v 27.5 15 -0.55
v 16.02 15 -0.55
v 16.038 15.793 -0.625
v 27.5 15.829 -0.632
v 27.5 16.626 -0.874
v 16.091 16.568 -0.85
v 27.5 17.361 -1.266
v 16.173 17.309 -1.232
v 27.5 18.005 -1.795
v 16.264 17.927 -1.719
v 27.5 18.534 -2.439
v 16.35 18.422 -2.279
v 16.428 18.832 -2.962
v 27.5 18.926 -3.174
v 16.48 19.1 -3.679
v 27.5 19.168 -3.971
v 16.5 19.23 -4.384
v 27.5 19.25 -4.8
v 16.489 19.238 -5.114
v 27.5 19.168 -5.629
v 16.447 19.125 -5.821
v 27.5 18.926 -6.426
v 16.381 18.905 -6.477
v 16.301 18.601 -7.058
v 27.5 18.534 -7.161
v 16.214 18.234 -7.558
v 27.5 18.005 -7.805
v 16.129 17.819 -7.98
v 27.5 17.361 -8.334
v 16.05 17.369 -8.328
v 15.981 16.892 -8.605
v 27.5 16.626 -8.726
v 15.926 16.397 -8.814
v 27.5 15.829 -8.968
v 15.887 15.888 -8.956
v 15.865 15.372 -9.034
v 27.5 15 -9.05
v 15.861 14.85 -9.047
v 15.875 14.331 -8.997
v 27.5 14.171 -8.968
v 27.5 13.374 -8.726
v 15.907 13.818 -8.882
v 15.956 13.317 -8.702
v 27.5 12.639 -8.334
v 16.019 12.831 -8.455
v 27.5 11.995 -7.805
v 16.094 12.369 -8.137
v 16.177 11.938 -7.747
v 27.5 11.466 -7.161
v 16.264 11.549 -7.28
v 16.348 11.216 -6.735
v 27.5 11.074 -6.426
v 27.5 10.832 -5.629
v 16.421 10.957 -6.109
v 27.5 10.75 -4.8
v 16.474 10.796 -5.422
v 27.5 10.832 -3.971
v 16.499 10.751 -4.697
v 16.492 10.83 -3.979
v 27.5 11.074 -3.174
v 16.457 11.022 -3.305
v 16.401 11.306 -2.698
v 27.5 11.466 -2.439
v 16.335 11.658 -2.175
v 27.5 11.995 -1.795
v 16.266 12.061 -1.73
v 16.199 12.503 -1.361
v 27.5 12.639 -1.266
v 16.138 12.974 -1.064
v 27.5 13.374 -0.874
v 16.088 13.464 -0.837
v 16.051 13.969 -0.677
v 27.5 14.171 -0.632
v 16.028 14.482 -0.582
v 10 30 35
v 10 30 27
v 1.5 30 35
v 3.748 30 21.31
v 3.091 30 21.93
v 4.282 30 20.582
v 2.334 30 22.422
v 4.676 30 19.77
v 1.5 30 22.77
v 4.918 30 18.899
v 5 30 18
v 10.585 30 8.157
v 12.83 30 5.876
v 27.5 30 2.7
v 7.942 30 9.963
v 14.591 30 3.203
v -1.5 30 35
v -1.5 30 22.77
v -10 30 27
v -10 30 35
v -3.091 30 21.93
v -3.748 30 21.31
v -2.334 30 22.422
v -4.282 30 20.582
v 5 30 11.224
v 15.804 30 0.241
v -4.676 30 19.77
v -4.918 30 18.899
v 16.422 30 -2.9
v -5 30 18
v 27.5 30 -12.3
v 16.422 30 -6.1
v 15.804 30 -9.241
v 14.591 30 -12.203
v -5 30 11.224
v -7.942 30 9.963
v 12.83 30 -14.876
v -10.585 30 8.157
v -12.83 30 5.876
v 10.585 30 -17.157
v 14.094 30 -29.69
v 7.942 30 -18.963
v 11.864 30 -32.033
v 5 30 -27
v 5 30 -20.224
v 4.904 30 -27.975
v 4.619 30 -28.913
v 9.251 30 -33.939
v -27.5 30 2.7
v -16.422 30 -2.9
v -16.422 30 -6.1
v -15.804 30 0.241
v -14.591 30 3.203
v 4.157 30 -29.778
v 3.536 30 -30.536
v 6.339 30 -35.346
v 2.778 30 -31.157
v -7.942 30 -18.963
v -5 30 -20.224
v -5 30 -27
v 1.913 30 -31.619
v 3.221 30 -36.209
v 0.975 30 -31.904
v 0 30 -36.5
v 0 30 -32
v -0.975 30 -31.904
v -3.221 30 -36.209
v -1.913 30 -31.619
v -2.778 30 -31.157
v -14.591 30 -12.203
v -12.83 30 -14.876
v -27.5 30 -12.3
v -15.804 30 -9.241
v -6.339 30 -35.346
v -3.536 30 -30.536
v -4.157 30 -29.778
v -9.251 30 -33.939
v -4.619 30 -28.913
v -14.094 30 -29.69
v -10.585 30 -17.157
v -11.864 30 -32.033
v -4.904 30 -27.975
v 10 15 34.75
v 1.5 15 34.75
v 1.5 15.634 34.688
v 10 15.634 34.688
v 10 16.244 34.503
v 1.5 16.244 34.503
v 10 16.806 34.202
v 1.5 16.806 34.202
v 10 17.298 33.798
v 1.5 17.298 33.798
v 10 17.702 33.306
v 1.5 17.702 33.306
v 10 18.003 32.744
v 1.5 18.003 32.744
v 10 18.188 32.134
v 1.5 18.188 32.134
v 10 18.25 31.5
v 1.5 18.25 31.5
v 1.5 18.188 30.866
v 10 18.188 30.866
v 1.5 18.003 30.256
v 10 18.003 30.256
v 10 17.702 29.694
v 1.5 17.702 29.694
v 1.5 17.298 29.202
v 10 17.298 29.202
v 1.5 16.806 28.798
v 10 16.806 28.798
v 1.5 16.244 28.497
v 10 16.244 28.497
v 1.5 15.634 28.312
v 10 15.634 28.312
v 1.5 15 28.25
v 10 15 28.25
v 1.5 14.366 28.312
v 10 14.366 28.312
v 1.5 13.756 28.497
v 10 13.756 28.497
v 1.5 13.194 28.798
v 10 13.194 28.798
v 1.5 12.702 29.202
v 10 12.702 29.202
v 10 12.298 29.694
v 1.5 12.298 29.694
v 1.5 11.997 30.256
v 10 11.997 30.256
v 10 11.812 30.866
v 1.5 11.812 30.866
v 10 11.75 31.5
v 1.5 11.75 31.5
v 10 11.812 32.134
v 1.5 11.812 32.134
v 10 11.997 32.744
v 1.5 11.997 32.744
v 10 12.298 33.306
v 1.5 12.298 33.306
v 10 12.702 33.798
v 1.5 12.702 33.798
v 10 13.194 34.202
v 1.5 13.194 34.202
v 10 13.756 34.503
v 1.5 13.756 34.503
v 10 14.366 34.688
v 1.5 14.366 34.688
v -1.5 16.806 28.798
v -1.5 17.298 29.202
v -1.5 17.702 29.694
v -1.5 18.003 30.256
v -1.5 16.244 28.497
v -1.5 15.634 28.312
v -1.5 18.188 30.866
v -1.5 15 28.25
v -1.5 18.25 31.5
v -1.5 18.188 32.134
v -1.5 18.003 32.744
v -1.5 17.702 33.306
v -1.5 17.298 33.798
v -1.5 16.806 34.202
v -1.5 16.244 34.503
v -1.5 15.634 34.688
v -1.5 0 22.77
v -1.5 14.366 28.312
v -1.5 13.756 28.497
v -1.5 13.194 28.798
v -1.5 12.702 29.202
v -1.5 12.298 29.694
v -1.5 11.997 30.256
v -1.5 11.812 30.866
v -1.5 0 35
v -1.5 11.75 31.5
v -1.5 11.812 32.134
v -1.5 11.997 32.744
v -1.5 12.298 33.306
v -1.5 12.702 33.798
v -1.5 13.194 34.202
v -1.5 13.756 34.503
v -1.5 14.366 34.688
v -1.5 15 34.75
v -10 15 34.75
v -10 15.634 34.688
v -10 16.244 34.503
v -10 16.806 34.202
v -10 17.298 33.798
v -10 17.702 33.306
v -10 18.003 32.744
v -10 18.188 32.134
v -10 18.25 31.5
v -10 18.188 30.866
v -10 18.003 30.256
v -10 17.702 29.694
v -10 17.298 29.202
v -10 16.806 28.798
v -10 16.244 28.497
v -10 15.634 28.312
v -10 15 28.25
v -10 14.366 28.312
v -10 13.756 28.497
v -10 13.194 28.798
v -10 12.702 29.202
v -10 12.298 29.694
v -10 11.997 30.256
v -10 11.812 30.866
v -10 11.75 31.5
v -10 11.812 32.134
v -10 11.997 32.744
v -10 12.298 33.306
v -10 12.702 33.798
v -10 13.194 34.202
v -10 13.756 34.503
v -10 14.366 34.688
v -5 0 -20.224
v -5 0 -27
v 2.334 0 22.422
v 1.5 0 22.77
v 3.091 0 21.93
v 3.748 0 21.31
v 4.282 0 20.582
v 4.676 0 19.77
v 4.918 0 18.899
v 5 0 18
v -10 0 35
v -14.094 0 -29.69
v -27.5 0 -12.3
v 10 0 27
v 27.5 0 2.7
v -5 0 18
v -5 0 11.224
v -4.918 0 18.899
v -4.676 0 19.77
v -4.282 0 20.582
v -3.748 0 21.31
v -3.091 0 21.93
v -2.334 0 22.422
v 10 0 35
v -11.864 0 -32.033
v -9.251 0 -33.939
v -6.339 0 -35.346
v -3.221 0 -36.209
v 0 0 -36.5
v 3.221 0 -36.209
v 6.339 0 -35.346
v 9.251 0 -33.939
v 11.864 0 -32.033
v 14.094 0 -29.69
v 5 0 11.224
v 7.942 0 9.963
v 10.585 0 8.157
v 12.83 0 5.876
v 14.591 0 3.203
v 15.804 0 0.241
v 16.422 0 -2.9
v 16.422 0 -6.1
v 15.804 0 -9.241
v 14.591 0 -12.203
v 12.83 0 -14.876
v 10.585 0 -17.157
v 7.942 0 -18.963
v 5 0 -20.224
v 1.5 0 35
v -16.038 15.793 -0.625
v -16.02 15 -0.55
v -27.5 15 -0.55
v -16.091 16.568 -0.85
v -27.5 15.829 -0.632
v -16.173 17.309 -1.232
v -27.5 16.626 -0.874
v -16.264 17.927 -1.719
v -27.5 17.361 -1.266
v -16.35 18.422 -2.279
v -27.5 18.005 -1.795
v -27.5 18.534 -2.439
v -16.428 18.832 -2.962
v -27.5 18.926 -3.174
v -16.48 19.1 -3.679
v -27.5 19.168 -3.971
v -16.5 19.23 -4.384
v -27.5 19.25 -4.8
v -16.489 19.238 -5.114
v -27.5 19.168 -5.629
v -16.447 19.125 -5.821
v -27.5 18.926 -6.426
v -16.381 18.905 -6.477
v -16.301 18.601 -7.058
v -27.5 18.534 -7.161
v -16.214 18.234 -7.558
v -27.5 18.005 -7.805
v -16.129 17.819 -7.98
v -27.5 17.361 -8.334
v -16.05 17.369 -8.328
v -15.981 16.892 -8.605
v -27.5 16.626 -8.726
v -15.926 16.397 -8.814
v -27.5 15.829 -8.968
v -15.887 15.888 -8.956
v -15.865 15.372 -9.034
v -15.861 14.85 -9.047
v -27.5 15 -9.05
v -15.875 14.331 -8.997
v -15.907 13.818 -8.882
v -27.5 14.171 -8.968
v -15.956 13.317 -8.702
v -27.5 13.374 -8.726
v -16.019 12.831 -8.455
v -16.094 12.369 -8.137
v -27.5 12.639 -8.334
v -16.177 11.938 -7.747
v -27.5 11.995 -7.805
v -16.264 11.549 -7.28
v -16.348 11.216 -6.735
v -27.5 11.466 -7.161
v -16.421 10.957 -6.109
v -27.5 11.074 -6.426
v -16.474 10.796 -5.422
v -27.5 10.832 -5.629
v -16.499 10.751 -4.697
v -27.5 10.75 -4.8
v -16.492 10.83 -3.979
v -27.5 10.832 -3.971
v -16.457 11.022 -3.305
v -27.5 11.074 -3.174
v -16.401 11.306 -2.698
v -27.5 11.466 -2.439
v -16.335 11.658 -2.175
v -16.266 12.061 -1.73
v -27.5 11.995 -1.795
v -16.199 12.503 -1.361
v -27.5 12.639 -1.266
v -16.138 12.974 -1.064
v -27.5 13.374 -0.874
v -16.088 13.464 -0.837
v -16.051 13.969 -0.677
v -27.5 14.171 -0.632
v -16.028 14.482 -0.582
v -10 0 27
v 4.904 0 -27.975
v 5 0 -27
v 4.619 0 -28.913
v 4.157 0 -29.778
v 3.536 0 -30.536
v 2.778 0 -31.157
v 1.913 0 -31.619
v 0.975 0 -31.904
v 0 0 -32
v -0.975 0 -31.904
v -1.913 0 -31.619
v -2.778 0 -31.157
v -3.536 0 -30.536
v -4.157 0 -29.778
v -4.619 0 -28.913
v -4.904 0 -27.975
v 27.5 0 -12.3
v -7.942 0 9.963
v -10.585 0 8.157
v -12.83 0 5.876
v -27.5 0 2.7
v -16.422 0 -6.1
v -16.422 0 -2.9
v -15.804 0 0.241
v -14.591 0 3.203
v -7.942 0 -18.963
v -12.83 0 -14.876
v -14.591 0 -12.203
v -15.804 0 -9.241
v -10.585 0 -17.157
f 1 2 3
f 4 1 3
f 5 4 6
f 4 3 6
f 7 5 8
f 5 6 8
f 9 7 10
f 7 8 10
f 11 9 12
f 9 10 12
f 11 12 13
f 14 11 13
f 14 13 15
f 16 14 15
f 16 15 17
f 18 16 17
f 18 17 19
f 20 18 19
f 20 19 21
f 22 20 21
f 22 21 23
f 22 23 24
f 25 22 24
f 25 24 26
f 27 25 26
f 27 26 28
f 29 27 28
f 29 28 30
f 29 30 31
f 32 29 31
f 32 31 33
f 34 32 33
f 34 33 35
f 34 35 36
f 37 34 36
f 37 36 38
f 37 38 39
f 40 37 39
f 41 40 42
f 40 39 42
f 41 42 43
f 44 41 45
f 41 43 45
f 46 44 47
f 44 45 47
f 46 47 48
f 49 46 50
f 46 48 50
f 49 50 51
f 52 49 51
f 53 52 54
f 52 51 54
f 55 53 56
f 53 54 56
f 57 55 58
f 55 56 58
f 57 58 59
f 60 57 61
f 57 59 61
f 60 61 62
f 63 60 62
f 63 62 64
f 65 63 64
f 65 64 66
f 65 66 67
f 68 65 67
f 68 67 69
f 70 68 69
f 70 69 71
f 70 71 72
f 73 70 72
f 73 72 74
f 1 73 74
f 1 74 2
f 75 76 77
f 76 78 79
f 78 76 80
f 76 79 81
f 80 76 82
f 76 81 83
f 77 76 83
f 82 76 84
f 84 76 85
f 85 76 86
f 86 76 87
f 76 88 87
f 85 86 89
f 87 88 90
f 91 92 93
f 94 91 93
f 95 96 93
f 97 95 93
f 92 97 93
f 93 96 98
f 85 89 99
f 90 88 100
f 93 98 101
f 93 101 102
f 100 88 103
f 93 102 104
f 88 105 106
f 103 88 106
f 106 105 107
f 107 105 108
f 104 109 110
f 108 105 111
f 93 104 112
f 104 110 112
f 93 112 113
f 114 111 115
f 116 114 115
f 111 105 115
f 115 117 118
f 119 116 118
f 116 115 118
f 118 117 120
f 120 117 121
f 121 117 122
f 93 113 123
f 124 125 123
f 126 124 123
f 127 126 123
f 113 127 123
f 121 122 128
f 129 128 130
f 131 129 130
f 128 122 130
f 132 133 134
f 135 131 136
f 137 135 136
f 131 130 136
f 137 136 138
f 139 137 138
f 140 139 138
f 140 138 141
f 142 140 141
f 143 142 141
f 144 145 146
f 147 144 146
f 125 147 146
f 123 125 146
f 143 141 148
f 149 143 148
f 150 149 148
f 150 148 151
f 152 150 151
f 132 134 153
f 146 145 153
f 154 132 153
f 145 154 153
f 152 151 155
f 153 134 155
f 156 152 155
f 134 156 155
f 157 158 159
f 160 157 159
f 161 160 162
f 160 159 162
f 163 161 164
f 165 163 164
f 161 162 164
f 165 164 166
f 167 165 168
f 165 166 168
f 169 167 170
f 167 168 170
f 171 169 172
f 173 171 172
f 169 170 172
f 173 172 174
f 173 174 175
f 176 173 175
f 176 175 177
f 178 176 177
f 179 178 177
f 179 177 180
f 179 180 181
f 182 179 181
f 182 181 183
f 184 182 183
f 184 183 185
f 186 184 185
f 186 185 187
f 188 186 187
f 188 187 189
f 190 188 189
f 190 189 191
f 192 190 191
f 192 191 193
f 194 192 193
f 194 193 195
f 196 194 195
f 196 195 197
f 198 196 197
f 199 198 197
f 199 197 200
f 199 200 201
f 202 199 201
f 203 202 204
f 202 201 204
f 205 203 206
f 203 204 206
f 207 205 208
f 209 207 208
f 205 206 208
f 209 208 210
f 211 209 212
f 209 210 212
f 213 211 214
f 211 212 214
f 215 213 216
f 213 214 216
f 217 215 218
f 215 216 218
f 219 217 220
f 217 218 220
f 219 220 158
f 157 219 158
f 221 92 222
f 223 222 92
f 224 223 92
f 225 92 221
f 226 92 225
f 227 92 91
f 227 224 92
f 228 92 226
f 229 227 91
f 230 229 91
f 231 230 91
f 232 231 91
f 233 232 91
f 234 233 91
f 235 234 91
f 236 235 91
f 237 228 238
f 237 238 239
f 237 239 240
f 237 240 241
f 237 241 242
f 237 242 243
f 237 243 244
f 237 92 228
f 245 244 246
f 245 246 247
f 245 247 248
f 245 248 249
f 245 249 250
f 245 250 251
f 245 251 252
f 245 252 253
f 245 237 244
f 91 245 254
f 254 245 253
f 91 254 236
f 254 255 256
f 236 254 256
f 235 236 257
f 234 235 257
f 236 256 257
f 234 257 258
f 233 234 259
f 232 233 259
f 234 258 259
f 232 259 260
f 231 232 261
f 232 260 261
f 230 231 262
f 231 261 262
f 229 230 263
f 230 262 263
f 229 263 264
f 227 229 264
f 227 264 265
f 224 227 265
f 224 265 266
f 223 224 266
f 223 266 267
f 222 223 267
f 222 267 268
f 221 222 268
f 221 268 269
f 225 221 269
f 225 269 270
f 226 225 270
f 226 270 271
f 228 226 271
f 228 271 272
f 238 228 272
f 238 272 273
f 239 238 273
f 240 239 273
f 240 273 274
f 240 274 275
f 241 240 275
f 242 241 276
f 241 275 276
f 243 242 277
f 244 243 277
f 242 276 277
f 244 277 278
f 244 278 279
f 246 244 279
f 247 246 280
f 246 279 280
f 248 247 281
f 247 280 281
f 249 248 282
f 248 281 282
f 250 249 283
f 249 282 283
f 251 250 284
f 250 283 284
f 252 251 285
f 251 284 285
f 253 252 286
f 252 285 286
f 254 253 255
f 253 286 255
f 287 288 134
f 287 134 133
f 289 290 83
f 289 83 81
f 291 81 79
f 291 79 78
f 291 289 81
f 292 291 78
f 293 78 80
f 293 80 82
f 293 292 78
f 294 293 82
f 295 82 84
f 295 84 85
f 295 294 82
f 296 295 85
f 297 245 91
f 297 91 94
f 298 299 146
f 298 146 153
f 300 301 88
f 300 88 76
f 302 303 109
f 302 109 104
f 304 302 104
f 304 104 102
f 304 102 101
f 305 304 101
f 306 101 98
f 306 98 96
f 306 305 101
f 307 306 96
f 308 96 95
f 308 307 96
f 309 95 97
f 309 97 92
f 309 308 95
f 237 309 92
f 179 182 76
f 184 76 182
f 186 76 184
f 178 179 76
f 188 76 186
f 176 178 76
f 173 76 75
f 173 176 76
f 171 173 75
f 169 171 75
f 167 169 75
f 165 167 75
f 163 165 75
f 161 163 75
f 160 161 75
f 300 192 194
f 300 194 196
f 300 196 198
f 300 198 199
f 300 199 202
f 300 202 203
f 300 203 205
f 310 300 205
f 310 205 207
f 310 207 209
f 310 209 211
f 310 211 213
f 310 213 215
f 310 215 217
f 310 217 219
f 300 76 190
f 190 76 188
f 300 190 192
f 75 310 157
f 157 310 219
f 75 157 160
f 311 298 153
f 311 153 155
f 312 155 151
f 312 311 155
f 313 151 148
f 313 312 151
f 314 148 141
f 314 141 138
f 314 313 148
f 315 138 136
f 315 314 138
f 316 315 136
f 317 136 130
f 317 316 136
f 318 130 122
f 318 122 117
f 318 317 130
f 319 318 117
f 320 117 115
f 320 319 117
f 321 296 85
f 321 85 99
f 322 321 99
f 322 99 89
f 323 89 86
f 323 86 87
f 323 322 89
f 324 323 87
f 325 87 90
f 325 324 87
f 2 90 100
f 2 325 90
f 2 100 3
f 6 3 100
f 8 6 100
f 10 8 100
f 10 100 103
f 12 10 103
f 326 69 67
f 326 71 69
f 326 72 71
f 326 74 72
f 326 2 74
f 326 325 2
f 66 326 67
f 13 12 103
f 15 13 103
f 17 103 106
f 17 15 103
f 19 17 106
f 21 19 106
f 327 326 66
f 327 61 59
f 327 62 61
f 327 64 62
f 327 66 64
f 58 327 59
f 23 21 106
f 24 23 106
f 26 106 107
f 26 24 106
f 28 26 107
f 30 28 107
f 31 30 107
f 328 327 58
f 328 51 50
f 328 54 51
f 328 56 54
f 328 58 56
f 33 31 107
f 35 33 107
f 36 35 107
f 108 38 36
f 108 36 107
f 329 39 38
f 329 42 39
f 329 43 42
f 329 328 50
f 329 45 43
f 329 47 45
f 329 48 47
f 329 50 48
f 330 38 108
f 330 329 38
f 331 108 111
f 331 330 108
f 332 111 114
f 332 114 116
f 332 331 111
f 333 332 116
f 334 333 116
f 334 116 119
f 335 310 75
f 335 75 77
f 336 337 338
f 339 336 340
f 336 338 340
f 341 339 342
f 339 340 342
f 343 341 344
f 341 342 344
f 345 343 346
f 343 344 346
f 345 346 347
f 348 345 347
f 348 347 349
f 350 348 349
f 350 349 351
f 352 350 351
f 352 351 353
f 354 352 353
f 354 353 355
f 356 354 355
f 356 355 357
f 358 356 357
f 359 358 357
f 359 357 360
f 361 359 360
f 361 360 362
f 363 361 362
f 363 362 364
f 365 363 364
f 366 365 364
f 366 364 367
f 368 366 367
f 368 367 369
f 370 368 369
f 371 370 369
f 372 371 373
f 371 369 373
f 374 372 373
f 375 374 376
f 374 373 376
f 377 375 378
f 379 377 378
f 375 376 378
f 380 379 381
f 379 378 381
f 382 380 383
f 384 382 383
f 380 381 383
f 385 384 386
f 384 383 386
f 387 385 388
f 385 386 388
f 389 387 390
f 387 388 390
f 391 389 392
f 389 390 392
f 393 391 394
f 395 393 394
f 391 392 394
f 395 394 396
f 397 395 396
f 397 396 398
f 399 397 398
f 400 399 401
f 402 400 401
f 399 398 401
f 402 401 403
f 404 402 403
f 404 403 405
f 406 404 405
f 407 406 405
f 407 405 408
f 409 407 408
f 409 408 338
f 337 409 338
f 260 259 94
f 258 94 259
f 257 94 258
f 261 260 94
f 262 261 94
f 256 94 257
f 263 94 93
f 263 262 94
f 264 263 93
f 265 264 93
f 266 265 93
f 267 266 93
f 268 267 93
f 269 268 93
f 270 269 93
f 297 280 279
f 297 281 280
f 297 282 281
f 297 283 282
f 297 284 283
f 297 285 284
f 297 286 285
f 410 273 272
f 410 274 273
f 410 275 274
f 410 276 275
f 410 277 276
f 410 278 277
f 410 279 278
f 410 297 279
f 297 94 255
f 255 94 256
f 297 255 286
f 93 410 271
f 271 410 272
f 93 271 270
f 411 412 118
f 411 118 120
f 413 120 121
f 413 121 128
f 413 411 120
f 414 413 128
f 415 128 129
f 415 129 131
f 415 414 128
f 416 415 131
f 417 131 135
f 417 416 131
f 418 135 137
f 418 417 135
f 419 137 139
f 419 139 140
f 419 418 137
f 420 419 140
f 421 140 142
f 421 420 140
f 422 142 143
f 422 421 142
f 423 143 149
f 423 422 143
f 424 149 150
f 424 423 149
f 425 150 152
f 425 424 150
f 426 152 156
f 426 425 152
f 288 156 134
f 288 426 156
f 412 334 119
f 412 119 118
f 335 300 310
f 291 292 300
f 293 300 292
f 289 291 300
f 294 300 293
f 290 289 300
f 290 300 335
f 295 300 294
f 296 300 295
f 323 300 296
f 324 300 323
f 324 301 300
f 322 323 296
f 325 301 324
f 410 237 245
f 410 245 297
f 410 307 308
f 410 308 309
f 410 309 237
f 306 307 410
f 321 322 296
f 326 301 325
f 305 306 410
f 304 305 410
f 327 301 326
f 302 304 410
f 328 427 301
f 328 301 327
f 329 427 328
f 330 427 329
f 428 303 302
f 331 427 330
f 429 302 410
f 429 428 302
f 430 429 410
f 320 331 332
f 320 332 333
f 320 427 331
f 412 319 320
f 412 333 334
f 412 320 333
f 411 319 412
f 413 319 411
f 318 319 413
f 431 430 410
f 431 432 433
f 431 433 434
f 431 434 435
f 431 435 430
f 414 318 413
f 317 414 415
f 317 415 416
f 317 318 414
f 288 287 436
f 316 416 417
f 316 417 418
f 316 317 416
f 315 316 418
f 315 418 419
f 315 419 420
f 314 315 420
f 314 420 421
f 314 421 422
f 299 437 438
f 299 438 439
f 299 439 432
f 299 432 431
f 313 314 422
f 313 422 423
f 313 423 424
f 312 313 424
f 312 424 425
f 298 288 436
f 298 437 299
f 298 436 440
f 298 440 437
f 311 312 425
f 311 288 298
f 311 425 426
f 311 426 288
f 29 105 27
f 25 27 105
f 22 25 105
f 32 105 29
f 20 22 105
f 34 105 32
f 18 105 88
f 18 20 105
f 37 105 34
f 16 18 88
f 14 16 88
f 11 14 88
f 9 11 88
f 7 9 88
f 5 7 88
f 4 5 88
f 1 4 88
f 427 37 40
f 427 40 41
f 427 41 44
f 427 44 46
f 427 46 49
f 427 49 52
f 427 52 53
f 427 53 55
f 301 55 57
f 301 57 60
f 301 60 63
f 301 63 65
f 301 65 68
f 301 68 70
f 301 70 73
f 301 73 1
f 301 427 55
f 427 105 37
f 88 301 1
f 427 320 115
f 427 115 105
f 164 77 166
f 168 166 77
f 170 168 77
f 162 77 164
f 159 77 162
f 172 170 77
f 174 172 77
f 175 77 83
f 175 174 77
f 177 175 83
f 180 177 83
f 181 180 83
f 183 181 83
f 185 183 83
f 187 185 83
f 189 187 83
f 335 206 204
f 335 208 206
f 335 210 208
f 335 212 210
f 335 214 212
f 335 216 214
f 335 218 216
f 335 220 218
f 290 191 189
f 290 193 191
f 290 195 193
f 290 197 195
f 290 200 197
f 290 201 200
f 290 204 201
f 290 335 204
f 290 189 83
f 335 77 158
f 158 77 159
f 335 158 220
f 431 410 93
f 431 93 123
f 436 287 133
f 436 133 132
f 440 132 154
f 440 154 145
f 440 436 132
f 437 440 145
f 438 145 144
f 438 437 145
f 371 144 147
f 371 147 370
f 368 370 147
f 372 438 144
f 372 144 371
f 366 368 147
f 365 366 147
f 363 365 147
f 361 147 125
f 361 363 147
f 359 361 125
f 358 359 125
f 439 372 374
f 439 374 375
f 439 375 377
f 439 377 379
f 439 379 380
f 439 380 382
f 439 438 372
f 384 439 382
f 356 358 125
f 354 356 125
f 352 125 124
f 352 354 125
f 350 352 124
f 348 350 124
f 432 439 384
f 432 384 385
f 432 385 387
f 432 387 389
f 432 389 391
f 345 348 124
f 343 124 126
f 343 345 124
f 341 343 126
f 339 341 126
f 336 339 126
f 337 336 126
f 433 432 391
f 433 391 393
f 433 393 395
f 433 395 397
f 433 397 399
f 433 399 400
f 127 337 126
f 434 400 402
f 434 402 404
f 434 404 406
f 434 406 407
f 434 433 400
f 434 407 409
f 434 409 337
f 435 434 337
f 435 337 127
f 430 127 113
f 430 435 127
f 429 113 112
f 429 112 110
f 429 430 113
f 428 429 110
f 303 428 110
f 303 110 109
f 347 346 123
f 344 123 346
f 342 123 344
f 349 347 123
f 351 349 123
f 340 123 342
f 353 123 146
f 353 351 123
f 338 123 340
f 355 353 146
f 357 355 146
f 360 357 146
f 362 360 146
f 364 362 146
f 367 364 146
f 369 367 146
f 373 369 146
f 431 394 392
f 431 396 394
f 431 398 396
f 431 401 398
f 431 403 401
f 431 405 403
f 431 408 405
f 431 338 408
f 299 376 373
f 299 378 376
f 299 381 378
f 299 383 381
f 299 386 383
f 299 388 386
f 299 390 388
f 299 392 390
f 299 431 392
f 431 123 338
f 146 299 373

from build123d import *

# Parameters (mm, degrees)
BOSS_EXTRUDE2_DEPTH = 30
SKETCH2_R           = 4.25
CUT_EXTRUDE1_DEPTH  = 55.999999228
SKETCH5_R           = 3.25
CUT_EXTRUDE2_DEPTH  = 30


with BuildPart() as part:
    # Sketch1 → Boss-Extrude2 (new body)
    with BuildSketch(Plane(origin=(0, 0, 0), x_dir=(1, 0, 0), z_dir=(0, 1, 0))):
        with BuildLine():
            Line((-1.499999614, -22.769695991), (-1.499999614, -34.999999869))
            Line((-1.499999614, -34.999999869), (-9.999999614, -34.999999869))
            Line((-9.999999614, -34.999999869), (-9.999999614, -26.999999869))
            Line((-9.999999614, -26.999999869), (-27.499999614, -2.699999869))
            Line((-27.499999614, -2.699999869), (-27.499999614, 12.300000131))
            Line((-27.499999614, 12.300000131), (-14.093884058, 29.689647964))
            ThreePointArc((-14.093884058, 29.689647964), (0, 36.500000672), (14.093884058, 29.689647964))
            Line((14.093884058, 29.689647964), (27.499999614, 12.300000131))
            Line((27.499999614, 12.300000131), (27.499999614, -2.699999869))
            Line((27.499999614, -2.699999869), (9.999999344, -26.999999675))
            Line((9.999999344, -26.999999675), (9.999999344, -34.999999869))
            Line((9.999999344, -34.999999869), (1.500000386, -34.999999869))
            Line((1.500000386, -34.999999869), (1.500000386, -22.769695748))
            ThreePointArc((1.500000386, -22.769695748), (4.0311289, -20.958039634), (4.999999869, -18))
            Line((4.999999869, -18), (4.999999869, -11.224185235))
            ThreePointArc((4.999999869, -11.224185235), (16.5, 4.5), (4.999999869, 20.224185235))
            Line((4.999999869, 20.224185235), (4.999999869, 27))
            ThreePointArc((4.999999869, 27), (0, 31.999999869), (-4.999999869, 27))
            Line((-4.999999869, 27), (-4.999999869, 20.224185235))
            ThreePointArc((-4.999999869, 20.224185235), (-16.5, 4.5), (-4.999999869, -11.224185235))
            Line((-4.999999869, -11.224185235), (-4.999999869, -18))
            ThreePointArc((-4.999999869, -18), (-4.031128661, -20.95803996), (-1.499999614, -22.769695991))
        make_face()
    extrude(amount=BOSS_EXTRUDE2_DEPTH)

    # Sketch2 → Cut-Extrude1 (cut, through all)
    with BuildSketch(Plane.ZY.offset(27.499999614)):
        with Locations((-4.800000131, 15)):
            Circle(SKETCH2_R)
    extrude(amount=-CUT_EXTRUDE1_DEPTH, mode=Mode.SUBTRACT)

    # Sketch5 → Cut-Extrude2 (cut)
    with BuildSketch(Plane.ZY.offset(9.999999614)):
        with Locations((31.499999869, 15)):
            Circle(SKETCH5_R)
    extrude(amount=-CUT_EXTRUDE2_DEPTH, mode=Mode.SUBTRACT)


solid = part.part
